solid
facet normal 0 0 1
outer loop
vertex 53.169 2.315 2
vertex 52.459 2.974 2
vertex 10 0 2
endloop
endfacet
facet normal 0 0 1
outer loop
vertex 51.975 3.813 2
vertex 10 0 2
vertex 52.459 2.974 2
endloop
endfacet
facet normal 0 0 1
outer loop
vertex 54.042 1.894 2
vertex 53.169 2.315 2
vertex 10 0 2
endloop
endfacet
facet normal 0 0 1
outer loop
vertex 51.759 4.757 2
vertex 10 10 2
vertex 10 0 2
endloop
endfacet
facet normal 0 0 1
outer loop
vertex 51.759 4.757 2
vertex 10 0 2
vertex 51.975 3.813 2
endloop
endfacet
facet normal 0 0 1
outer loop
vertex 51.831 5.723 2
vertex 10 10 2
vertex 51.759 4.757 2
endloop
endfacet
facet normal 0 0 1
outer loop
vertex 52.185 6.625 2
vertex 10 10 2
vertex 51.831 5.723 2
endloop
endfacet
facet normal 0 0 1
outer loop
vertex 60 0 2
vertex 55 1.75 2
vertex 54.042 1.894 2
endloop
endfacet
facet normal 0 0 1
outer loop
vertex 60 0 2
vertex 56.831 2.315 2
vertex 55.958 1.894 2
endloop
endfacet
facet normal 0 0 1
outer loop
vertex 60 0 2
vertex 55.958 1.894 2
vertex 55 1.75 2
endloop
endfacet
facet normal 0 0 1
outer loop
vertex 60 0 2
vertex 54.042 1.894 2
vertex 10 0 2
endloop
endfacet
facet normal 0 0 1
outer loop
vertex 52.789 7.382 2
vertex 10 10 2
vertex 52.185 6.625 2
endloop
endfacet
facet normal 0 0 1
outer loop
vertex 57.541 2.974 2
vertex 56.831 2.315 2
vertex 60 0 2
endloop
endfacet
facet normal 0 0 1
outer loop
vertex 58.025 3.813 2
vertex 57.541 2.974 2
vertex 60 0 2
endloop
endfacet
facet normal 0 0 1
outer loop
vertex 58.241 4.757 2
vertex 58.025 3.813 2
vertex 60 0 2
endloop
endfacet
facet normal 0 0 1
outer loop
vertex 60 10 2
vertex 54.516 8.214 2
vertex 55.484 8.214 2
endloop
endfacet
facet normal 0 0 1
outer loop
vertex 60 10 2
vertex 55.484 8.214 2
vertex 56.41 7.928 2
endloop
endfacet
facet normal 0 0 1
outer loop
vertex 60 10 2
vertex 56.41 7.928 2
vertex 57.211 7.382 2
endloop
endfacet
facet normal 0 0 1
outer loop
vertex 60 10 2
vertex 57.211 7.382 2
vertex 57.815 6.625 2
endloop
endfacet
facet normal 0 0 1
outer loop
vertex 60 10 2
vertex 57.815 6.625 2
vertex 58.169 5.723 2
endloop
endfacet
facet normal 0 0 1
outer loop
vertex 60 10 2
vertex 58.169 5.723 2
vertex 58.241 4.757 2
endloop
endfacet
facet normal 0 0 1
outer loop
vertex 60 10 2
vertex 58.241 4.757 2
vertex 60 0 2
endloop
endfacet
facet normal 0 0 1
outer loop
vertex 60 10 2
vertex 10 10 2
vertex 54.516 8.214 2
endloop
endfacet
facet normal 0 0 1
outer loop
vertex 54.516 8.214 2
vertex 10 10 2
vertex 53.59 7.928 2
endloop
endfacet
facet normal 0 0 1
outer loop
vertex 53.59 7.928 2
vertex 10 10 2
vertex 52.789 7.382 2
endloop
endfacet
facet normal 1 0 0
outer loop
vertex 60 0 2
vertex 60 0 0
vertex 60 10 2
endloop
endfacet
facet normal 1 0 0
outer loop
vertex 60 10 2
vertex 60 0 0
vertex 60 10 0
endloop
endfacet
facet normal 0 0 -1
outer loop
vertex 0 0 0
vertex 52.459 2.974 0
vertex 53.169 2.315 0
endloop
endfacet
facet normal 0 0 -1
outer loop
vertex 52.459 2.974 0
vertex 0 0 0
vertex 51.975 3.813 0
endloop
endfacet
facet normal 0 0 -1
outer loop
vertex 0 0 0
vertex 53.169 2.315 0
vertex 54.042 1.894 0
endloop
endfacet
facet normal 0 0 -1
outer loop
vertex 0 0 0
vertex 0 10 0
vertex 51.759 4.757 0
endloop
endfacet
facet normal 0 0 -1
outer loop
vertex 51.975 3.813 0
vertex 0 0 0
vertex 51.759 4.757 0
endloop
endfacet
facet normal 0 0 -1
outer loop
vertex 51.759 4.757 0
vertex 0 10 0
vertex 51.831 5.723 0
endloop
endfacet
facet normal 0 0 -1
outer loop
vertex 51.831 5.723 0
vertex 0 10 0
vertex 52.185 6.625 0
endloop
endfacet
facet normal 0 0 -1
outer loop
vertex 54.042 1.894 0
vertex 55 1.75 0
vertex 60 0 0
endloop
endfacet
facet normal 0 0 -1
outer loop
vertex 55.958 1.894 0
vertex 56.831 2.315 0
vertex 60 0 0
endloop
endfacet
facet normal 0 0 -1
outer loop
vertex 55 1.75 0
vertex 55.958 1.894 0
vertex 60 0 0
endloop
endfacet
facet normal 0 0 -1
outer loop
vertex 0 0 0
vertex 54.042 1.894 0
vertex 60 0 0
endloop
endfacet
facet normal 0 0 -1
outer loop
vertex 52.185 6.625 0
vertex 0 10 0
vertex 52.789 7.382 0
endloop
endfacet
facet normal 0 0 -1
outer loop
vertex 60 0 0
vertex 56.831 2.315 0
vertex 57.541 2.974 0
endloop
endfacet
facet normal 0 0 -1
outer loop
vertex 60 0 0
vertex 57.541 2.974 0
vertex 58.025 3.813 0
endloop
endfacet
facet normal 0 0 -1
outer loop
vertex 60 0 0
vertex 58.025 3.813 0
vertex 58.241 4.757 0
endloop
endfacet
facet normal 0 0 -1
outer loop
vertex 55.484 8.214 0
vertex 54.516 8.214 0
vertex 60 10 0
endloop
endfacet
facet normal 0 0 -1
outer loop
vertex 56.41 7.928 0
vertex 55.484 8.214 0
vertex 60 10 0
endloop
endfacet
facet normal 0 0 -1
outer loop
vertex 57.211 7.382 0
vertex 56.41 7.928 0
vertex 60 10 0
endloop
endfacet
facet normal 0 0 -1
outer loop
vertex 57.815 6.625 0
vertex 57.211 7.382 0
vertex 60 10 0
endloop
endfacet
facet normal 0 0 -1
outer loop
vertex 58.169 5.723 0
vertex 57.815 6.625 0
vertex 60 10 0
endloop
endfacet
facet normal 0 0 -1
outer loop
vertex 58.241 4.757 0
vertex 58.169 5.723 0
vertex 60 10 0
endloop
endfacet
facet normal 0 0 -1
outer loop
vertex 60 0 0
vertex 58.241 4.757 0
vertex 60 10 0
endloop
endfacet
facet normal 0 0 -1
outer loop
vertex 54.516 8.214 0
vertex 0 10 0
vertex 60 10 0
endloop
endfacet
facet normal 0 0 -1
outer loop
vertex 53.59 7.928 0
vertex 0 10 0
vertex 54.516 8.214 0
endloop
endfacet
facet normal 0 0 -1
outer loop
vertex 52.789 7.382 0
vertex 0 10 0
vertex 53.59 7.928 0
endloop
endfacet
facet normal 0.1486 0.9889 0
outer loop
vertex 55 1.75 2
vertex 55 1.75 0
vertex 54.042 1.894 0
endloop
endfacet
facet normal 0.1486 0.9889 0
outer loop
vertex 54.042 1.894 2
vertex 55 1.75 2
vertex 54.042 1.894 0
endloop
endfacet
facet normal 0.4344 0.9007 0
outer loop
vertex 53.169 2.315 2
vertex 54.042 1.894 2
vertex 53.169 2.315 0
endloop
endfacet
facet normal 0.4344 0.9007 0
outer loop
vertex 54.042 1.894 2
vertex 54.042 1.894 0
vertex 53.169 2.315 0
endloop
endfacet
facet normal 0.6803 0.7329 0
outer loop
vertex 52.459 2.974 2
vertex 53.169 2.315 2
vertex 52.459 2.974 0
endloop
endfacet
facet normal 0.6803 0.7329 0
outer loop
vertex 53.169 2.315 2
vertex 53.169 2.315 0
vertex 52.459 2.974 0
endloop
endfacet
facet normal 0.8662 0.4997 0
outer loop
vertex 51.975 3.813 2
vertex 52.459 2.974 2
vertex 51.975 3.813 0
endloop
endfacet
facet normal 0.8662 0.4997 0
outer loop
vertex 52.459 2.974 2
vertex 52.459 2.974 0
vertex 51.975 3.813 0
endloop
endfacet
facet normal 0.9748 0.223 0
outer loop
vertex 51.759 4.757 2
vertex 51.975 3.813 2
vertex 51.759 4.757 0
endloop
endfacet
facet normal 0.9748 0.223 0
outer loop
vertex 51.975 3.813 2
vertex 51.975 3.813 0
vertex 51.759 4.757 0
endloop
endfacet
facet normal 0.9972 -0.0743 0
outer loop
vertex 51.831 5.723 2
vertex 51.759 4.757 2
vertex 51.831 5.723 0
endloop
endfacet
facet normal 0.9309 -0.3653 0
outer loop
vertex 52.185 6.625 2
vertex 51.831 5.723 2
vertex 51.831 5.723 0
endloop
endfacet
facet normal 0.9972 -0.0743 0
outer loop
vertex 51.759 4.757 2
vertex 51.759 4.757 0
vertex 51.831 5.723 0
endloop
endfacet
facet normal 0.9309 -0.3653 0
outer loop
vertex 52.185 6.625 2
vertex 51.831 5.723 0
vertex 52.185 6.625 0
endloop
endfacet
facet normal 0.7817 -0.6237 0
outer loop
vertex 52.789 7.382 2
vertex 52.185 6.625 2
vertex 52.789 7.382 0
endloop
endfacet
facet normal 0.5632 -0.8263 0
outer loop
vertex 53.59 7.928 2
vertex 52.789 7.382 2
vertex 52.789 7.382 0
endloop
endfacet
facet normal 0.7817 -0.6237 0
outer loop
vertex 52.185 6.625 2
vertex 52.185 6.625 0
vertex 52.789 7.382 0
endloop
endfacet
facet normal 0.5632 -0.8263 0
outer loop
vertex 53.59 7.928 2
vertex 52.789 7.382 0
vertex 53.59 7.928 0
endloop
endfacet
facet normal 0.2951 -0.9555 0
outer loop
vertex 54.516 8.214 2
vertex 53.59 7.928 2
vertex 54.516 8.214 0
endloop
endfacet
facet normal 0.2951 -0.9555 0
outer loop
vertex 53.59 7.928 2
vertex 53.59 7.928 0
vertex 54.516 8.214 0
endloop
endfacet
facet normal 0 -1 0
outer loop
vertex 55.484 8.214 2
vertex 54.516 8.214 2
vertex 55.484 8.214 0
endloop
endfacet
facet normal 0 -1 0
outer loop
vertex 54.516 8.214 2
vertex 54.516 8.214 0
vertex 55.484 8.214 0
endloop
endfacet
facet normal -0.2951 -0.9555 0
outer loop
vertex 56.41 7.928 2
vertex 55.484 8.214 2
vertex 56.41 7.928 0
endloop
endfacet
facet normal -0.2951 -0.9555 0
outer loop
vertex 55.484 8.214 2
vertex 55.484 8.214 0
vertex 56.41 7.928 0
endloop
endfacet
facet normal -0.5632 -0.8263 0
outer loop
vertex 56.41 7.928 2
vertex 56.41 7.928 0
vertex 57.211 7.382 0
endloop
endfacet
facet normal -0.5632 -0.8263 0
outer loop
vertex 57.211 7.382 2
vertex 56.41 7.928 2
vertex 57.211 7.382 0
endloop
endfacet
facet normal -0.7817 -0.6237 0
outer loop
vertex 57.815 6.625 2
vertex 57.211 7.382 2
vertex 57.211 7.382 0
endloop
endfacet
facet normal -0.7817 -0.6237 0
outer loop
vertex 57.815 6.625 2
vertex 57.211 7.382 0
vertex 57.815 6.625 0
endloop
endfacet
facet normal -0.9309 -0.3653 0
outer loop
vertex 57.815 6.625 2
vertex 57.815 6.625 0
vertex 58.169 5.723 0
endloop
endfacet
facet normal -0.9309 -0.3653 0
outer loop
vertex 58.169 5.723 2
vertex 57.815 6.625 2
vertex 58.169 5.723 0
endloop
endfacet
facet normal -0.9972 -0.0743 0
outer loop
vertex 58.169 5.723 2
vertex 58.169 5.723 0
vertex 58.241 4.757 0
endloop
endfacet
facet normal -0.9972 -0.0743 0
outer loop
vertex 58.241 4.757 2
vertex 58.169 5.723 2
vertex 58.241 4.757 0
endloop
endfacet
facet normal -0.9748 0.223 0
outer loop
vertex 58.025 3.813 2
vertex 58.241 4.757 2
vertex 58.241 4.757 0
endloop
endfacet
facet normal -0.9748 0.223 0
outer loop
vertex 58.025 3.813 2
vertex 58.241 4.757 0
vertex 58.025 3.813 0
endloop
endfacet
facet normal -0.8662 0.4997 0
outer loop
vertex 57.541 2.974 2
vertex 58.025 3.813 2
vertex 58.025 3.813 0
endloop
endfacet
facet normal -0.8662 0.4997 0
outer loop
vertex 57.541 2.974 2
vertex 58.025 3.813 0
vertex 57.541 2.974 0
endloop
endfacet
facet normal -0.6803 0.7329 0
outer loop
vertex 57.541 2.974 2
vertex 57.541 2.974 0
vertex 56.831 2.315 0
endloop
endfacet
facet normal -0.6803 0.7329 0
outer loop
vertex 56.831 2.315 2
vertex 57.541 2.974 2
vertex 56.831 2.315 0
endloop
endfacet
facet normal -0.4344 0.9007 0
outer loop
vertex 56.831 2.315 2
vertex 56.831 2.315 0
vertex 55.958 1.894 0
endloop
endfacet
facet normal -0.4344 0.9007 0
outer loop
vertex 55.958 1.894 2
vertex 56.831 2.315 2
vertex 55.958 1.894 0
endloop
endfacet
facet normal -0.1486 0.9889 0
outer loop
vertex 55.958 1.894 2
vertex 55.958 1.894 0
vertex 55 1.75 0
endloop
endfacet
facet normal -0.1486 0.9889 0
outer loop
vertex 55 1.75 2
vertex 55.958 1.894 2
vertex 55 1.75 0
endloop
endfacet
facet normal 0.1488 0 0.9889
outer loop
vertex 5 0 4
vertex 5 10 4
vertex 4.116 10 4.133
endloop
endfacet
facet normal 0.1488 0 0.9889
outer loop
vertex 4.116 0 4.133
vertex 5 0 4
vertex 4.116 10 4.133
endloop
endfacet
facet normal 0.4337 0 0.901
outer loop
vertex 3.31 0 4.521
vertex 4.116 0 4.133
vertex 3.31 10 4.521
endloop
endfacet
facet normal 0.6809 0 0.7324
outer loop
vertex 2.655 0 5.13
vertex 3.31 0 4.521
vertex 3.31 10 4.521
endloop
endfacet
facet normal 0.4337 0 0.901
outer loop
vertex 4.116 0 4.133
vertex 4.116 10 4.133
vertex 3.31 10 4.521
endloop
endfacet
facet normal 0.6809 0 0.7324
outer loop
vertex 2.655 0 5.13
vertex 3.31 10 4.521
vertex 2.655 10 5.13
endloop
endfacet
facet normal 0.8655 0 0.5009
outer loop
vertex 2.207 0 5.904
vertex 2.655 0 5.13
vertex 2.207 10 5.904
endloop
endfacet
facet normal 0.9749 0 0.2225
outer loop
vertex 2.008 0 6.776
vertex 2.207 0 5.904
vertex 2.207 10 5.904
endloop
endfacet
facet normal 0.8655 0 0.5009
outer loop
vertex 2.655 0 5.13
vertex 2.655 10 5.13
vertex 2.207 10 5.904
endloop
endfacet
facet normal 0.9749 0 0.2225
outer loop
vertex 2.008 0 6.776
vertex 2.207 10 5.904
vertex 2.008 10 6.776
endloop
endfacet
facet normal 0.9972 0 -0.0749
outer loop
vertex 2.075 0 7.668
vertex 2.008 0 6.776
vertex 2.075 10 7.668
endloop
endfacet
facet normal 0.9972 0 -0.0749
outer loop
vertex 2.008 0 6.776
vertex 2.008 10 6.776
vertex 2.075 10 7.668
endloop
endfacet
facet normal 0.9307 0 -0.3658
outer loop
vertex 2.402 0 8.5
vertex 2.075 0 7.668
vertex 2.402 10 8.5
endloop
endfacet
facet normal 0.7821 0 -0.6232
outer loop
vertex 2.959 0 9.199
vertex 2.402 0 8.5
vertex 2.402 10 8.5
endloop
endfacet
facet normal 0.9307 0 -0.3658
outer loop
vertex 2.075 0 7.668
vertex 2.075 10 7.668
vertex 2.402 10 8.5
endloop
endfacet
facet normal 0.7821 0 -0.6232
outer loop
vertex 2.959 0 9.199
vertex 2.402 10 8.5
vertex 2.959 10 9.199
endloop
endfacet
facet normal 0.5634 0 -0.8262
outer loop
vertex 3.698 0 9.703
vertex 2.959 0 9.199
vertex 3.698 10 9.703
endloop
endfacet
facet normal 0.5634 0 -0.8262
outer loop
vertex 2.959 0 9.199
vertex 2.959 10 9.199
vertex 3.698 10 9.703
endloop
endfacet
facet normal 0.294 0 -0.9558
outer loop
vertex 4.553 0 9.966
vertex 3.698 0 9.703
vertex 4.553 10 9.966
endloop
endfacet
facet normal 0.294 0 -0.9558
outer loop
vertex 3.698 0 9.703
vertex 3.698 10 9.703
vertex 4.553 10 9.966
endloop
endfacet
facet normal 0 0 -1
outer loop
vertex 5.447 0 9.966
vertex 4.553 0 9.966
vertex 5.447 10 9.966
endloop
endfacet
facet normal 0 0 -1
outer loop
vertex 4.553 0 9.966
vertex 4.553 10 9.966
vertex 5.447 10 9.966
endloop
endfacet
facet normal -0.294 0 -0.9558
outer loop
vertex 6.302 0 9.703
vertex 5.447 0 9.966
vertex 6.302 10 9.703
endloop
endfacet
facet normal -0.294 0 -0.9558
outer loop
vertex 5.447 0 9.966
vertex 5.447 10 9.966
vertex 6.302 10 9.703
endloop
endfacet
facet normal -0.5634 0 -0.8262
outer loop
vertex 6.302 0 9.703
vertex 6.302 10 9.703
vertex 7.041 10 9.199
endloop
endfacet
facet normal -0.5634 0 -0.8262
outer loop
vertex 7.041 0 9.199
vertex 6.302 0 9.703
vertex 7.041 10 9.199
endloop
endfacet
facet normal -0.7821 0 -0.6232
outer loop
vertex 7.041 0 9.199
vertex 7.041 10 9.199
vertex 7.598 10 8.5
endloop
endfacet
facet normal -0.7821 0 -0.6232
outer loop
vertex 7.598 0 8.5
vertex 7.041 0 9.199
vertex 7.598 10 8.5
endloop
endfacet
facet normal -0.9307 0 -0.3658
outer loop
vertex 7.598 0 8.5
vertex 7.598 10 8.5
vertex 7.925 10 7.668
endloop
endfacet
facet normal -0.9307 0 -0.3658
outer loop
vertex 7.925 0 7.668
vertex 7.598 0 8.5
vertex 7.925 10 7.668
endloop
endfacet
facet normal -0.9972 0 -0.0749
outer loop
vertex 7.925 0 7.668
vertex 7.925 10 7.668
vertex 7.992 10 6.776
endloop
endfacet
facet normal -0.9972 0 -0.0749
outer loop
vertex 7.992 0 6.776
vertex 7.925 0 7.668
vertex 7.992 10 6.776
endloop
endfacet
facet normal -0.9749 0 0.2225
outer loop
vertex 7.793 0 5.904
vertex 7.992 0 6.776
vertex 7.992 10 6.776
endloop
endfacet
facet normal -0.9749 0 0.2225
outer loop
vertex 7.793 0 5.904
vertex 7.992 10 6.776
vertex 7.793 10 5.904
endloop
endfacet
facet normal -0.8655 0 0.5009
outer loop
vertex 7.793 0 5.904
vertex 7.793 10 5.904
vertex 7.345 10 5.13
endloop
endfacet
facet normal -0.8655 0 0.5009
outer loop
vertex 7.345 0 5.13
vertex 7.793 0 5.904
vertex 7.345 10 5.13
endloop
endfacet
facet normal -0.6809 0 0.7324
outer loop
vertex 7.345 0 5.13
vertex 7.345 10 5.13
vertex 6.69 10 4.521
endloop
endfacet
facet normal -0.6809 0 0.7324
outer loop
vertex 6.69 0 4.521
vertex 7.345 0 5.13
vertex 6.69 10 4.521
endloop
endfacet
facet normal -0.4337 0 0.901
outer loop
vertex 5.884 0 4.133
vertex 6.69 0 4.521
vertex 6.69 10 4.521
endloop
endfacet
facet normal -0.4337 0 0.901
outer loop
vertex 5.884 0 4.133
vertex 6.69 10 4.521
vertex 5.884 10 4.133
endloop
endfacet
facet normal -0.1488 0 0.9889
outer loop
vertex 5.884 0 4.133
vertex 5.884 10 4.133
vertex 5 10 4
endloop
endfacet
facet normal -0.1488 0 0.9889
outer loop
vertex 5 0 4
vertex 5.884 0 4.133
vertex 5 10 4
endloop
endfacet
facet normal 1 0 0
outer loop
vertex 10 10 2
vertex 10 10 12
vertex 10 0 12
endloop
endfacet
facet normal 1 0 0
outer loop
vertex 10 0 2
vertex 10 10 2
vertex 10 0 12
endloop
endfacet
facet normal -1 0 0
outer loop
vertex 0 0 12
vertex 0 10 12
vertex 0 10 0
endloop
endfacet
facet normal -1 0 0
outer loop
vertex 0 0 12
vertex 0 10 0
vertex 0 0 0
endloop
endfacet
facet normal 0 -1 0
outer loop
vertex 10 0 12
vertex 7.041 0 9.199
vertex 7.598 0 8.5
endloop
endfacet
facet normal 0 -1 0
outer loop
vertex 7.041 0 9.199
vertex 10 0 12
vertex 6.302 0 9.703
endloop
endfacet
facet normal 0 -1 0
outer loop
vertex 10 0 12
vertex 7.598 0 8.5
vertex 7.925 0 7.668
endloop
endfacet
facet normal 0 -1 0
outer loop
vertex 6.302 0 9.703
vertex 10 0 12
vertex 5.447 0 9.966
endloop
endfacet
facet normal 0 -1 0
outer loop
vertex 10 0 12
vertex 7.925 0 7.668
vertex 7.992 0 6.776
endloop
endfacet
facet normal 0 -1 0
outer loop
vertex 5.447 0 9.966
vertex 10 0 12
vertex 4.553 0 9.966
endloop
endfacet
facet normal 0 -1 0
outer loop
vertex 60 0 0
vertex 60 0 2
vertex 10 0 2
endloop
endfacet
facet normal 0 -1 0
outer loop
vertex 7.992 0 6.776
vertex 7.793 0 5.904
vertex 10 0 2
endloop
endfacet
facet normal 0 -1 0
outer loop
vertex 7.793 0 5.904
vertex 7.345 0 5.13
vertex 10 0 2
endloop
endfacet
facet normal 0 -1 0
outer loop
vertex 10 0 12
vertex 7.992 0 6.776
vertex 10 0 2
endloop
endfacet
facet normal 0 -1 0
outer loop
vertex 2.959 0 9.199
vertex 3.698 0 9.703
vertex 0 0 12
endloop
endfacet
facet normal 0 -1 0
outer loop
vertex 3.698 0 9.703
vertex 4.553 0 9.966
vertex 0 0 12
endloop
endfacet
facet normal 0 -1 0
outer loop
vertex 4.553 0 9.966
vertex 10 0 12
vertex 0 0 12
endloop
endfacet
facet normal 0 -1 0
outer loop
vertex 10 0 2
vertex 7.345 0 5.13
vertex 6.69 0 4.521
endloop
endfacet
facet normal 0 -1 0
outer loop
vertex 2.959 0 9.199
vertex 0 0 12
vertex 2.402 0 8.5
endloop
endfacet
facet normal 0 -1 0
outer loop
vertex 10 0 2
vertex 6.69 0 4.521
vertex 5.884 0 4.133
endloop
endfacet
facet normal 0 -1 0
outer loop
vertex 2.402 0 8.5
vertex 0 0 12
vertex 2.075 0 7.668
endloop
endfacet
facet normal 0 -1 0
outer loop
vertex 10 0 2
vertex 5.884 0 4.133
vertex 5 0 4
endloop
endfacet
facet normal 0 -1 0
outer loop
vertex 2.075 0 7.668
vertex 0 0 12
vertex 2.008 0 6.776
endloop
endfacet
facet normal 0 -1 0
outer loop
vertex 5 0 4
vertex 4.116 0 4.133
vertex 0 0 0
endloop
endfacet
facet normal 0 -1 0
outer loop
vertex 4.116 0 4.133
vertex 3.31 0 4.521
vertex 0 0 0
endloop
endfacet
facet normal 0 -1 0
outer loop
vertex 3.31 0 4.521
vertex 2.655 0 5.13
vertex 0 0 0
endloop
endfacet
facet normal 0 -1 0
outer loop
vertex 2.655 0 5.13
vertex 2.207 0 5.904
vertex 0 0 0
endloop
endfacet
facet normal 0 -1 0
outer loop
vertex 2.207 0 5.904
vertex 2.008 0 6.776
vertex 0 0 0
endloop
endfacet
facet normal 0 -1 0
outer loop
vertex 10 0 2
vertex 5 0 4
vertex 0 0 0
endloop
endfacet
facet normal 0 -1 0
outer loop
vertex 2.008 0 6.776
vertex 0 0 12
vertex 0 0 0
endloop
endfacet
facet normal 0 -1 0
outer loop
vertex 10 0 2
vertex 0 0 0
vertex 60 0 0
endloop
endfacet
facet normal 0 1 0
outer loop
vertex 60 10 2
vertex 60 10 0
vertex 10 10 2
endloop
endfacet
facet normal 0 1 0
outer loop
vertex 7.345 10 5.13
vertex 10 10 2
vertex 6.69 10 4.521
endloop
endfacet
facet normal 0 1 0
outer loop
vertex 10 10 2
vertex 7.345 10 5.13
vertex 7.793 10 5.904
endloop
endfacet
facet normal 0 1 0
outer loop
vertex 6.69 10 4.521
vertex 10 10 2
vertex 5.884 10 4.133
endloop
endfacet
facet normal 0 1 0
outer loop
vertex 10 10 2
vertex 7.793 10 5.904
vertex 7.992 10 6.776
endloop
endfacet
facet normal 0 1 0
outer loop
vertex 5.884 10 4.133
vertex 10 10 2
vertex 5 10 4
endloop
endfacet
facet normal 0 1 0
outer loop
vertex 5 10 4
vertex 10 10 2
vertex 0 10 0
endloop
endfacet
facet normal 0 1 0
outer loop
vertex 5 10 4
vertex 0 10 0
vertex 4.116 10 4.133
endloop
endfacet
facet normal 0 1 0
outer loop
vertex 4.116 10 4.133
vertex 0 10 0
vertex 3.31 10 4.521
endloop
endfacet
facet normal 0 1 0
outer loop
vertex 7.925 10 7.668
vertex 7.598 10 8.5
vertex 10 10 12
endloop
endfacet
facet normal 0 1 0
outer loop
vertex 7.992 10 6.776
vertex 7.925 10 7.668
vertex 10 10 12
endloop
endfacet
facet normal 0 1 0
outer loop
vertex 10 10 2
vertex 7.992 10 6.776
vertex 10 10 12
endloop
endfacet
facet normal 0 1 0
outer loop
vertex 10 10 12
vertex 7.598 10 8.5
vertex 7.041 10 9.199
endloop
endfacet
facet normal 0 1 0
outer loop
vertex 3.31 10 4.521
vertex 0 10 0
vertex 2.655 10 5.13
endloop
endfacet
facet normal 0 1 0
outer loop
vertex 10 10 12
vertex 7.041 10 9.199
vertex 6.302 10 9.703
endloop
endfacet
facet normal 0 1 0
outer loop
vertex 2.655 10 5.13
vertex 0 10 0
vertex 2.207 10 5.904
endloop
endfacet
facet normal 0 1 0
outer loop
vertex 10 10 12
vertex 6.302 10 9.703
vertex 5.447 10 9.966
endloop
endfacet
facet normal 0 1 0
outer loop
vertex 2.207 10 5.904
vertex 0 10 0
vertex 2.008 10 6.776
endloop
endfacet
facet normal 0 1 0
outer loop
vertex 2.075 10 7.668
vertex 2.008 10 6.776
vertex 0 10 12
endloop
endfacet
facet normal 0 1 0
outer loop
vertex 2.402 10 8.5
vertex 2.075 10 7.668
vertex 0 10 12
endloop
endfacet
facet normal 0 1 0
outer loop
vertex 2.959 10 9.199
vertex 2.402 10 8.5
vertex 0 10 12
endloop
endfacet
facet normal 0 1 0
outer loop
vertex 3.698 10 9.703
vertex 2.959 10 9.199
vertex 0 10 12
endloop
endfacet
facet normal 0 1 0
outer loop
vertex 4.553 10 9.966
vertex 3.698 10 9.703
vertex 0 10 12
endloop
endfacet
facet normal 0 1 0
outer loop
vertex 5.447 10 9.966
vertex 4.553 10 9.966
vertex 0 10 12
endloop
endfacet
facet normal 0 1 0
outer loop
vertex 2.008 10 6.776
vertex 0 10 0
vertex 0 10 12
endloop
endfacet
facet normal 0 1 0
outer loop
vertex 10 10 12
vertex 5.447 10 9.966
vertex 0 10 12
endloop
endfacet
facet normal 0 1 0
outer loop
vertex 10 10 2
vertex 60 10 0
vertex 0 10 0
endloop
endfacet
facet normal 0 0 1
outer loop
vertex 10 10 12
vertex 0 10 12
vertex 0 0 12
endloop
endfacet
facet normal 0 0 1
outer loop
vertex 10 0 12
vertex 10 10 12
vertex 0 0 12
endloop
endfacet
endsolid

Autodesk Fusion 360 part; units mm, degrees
sketch "Sketch1" plane through (0, 0, 0) normal (0, 0, 1) x (1, 0, 0)
  line L0 (0, 0) -> (60, 0)
  line L1 (60, 0) -> (60, 10)
  line L2 (60, 10) -> (0, 10)
  line L3 (0, 10) -> (0, 0)
  dimension "d1" = 60
  dimension "d2" = 10
extrude "Extrude1" add sketch "Sketch1" along normal blind 2
hole "Hole1" at (55, 5, 2) direction (0, 0, -1) diameter 3.4 depth 8.6 tip angle 180 counterbore diameter 6.5 counterbore depth 3
sketch "Sketch2" plane through (0, 0, 0) normal (-1, 0, 0) x (0, -1, 0)
  line L0 (-10, 0) -> (0, 0)
  line L1 (0, 0) -> (0, 2)
  line L2 (0, 2) -> (-10, 2)
  line L3 (-10, 2) -> (-10, 0)
  line L4 (0, 2) -> (-10, 2)
  line L5 (-10, 2) -> (-10, 12)
  line L6 (-10, 12) -> (0, 12)
  line L7 (0, 12) -> (0, 2)
  dimension "d12" = 10
  dimension "d13" = 10
extrude "Extrude2" add sketch "Sketch2" against normal blind 10 contours L2 L4 L5 L6 L7
hole "Hole2" at (5, 0, 7) direction (0, 1, 0) diameter 6 depth 12 tip angle 180
sketch "Sketch3" plane through (0, 0, 2) normal (0, 0, 1) x (-1, 0, 0)
  line L0 (-10, -10) -> (-10, 0)
  line L1 (-10, 0) -> (-60, 0)
  line L2 (-60, 0) -> (-60, -10)
  line L3 (-60, -10) -> (-10, -10)
  circle A0 centre (-55, -5) radius 3.25
